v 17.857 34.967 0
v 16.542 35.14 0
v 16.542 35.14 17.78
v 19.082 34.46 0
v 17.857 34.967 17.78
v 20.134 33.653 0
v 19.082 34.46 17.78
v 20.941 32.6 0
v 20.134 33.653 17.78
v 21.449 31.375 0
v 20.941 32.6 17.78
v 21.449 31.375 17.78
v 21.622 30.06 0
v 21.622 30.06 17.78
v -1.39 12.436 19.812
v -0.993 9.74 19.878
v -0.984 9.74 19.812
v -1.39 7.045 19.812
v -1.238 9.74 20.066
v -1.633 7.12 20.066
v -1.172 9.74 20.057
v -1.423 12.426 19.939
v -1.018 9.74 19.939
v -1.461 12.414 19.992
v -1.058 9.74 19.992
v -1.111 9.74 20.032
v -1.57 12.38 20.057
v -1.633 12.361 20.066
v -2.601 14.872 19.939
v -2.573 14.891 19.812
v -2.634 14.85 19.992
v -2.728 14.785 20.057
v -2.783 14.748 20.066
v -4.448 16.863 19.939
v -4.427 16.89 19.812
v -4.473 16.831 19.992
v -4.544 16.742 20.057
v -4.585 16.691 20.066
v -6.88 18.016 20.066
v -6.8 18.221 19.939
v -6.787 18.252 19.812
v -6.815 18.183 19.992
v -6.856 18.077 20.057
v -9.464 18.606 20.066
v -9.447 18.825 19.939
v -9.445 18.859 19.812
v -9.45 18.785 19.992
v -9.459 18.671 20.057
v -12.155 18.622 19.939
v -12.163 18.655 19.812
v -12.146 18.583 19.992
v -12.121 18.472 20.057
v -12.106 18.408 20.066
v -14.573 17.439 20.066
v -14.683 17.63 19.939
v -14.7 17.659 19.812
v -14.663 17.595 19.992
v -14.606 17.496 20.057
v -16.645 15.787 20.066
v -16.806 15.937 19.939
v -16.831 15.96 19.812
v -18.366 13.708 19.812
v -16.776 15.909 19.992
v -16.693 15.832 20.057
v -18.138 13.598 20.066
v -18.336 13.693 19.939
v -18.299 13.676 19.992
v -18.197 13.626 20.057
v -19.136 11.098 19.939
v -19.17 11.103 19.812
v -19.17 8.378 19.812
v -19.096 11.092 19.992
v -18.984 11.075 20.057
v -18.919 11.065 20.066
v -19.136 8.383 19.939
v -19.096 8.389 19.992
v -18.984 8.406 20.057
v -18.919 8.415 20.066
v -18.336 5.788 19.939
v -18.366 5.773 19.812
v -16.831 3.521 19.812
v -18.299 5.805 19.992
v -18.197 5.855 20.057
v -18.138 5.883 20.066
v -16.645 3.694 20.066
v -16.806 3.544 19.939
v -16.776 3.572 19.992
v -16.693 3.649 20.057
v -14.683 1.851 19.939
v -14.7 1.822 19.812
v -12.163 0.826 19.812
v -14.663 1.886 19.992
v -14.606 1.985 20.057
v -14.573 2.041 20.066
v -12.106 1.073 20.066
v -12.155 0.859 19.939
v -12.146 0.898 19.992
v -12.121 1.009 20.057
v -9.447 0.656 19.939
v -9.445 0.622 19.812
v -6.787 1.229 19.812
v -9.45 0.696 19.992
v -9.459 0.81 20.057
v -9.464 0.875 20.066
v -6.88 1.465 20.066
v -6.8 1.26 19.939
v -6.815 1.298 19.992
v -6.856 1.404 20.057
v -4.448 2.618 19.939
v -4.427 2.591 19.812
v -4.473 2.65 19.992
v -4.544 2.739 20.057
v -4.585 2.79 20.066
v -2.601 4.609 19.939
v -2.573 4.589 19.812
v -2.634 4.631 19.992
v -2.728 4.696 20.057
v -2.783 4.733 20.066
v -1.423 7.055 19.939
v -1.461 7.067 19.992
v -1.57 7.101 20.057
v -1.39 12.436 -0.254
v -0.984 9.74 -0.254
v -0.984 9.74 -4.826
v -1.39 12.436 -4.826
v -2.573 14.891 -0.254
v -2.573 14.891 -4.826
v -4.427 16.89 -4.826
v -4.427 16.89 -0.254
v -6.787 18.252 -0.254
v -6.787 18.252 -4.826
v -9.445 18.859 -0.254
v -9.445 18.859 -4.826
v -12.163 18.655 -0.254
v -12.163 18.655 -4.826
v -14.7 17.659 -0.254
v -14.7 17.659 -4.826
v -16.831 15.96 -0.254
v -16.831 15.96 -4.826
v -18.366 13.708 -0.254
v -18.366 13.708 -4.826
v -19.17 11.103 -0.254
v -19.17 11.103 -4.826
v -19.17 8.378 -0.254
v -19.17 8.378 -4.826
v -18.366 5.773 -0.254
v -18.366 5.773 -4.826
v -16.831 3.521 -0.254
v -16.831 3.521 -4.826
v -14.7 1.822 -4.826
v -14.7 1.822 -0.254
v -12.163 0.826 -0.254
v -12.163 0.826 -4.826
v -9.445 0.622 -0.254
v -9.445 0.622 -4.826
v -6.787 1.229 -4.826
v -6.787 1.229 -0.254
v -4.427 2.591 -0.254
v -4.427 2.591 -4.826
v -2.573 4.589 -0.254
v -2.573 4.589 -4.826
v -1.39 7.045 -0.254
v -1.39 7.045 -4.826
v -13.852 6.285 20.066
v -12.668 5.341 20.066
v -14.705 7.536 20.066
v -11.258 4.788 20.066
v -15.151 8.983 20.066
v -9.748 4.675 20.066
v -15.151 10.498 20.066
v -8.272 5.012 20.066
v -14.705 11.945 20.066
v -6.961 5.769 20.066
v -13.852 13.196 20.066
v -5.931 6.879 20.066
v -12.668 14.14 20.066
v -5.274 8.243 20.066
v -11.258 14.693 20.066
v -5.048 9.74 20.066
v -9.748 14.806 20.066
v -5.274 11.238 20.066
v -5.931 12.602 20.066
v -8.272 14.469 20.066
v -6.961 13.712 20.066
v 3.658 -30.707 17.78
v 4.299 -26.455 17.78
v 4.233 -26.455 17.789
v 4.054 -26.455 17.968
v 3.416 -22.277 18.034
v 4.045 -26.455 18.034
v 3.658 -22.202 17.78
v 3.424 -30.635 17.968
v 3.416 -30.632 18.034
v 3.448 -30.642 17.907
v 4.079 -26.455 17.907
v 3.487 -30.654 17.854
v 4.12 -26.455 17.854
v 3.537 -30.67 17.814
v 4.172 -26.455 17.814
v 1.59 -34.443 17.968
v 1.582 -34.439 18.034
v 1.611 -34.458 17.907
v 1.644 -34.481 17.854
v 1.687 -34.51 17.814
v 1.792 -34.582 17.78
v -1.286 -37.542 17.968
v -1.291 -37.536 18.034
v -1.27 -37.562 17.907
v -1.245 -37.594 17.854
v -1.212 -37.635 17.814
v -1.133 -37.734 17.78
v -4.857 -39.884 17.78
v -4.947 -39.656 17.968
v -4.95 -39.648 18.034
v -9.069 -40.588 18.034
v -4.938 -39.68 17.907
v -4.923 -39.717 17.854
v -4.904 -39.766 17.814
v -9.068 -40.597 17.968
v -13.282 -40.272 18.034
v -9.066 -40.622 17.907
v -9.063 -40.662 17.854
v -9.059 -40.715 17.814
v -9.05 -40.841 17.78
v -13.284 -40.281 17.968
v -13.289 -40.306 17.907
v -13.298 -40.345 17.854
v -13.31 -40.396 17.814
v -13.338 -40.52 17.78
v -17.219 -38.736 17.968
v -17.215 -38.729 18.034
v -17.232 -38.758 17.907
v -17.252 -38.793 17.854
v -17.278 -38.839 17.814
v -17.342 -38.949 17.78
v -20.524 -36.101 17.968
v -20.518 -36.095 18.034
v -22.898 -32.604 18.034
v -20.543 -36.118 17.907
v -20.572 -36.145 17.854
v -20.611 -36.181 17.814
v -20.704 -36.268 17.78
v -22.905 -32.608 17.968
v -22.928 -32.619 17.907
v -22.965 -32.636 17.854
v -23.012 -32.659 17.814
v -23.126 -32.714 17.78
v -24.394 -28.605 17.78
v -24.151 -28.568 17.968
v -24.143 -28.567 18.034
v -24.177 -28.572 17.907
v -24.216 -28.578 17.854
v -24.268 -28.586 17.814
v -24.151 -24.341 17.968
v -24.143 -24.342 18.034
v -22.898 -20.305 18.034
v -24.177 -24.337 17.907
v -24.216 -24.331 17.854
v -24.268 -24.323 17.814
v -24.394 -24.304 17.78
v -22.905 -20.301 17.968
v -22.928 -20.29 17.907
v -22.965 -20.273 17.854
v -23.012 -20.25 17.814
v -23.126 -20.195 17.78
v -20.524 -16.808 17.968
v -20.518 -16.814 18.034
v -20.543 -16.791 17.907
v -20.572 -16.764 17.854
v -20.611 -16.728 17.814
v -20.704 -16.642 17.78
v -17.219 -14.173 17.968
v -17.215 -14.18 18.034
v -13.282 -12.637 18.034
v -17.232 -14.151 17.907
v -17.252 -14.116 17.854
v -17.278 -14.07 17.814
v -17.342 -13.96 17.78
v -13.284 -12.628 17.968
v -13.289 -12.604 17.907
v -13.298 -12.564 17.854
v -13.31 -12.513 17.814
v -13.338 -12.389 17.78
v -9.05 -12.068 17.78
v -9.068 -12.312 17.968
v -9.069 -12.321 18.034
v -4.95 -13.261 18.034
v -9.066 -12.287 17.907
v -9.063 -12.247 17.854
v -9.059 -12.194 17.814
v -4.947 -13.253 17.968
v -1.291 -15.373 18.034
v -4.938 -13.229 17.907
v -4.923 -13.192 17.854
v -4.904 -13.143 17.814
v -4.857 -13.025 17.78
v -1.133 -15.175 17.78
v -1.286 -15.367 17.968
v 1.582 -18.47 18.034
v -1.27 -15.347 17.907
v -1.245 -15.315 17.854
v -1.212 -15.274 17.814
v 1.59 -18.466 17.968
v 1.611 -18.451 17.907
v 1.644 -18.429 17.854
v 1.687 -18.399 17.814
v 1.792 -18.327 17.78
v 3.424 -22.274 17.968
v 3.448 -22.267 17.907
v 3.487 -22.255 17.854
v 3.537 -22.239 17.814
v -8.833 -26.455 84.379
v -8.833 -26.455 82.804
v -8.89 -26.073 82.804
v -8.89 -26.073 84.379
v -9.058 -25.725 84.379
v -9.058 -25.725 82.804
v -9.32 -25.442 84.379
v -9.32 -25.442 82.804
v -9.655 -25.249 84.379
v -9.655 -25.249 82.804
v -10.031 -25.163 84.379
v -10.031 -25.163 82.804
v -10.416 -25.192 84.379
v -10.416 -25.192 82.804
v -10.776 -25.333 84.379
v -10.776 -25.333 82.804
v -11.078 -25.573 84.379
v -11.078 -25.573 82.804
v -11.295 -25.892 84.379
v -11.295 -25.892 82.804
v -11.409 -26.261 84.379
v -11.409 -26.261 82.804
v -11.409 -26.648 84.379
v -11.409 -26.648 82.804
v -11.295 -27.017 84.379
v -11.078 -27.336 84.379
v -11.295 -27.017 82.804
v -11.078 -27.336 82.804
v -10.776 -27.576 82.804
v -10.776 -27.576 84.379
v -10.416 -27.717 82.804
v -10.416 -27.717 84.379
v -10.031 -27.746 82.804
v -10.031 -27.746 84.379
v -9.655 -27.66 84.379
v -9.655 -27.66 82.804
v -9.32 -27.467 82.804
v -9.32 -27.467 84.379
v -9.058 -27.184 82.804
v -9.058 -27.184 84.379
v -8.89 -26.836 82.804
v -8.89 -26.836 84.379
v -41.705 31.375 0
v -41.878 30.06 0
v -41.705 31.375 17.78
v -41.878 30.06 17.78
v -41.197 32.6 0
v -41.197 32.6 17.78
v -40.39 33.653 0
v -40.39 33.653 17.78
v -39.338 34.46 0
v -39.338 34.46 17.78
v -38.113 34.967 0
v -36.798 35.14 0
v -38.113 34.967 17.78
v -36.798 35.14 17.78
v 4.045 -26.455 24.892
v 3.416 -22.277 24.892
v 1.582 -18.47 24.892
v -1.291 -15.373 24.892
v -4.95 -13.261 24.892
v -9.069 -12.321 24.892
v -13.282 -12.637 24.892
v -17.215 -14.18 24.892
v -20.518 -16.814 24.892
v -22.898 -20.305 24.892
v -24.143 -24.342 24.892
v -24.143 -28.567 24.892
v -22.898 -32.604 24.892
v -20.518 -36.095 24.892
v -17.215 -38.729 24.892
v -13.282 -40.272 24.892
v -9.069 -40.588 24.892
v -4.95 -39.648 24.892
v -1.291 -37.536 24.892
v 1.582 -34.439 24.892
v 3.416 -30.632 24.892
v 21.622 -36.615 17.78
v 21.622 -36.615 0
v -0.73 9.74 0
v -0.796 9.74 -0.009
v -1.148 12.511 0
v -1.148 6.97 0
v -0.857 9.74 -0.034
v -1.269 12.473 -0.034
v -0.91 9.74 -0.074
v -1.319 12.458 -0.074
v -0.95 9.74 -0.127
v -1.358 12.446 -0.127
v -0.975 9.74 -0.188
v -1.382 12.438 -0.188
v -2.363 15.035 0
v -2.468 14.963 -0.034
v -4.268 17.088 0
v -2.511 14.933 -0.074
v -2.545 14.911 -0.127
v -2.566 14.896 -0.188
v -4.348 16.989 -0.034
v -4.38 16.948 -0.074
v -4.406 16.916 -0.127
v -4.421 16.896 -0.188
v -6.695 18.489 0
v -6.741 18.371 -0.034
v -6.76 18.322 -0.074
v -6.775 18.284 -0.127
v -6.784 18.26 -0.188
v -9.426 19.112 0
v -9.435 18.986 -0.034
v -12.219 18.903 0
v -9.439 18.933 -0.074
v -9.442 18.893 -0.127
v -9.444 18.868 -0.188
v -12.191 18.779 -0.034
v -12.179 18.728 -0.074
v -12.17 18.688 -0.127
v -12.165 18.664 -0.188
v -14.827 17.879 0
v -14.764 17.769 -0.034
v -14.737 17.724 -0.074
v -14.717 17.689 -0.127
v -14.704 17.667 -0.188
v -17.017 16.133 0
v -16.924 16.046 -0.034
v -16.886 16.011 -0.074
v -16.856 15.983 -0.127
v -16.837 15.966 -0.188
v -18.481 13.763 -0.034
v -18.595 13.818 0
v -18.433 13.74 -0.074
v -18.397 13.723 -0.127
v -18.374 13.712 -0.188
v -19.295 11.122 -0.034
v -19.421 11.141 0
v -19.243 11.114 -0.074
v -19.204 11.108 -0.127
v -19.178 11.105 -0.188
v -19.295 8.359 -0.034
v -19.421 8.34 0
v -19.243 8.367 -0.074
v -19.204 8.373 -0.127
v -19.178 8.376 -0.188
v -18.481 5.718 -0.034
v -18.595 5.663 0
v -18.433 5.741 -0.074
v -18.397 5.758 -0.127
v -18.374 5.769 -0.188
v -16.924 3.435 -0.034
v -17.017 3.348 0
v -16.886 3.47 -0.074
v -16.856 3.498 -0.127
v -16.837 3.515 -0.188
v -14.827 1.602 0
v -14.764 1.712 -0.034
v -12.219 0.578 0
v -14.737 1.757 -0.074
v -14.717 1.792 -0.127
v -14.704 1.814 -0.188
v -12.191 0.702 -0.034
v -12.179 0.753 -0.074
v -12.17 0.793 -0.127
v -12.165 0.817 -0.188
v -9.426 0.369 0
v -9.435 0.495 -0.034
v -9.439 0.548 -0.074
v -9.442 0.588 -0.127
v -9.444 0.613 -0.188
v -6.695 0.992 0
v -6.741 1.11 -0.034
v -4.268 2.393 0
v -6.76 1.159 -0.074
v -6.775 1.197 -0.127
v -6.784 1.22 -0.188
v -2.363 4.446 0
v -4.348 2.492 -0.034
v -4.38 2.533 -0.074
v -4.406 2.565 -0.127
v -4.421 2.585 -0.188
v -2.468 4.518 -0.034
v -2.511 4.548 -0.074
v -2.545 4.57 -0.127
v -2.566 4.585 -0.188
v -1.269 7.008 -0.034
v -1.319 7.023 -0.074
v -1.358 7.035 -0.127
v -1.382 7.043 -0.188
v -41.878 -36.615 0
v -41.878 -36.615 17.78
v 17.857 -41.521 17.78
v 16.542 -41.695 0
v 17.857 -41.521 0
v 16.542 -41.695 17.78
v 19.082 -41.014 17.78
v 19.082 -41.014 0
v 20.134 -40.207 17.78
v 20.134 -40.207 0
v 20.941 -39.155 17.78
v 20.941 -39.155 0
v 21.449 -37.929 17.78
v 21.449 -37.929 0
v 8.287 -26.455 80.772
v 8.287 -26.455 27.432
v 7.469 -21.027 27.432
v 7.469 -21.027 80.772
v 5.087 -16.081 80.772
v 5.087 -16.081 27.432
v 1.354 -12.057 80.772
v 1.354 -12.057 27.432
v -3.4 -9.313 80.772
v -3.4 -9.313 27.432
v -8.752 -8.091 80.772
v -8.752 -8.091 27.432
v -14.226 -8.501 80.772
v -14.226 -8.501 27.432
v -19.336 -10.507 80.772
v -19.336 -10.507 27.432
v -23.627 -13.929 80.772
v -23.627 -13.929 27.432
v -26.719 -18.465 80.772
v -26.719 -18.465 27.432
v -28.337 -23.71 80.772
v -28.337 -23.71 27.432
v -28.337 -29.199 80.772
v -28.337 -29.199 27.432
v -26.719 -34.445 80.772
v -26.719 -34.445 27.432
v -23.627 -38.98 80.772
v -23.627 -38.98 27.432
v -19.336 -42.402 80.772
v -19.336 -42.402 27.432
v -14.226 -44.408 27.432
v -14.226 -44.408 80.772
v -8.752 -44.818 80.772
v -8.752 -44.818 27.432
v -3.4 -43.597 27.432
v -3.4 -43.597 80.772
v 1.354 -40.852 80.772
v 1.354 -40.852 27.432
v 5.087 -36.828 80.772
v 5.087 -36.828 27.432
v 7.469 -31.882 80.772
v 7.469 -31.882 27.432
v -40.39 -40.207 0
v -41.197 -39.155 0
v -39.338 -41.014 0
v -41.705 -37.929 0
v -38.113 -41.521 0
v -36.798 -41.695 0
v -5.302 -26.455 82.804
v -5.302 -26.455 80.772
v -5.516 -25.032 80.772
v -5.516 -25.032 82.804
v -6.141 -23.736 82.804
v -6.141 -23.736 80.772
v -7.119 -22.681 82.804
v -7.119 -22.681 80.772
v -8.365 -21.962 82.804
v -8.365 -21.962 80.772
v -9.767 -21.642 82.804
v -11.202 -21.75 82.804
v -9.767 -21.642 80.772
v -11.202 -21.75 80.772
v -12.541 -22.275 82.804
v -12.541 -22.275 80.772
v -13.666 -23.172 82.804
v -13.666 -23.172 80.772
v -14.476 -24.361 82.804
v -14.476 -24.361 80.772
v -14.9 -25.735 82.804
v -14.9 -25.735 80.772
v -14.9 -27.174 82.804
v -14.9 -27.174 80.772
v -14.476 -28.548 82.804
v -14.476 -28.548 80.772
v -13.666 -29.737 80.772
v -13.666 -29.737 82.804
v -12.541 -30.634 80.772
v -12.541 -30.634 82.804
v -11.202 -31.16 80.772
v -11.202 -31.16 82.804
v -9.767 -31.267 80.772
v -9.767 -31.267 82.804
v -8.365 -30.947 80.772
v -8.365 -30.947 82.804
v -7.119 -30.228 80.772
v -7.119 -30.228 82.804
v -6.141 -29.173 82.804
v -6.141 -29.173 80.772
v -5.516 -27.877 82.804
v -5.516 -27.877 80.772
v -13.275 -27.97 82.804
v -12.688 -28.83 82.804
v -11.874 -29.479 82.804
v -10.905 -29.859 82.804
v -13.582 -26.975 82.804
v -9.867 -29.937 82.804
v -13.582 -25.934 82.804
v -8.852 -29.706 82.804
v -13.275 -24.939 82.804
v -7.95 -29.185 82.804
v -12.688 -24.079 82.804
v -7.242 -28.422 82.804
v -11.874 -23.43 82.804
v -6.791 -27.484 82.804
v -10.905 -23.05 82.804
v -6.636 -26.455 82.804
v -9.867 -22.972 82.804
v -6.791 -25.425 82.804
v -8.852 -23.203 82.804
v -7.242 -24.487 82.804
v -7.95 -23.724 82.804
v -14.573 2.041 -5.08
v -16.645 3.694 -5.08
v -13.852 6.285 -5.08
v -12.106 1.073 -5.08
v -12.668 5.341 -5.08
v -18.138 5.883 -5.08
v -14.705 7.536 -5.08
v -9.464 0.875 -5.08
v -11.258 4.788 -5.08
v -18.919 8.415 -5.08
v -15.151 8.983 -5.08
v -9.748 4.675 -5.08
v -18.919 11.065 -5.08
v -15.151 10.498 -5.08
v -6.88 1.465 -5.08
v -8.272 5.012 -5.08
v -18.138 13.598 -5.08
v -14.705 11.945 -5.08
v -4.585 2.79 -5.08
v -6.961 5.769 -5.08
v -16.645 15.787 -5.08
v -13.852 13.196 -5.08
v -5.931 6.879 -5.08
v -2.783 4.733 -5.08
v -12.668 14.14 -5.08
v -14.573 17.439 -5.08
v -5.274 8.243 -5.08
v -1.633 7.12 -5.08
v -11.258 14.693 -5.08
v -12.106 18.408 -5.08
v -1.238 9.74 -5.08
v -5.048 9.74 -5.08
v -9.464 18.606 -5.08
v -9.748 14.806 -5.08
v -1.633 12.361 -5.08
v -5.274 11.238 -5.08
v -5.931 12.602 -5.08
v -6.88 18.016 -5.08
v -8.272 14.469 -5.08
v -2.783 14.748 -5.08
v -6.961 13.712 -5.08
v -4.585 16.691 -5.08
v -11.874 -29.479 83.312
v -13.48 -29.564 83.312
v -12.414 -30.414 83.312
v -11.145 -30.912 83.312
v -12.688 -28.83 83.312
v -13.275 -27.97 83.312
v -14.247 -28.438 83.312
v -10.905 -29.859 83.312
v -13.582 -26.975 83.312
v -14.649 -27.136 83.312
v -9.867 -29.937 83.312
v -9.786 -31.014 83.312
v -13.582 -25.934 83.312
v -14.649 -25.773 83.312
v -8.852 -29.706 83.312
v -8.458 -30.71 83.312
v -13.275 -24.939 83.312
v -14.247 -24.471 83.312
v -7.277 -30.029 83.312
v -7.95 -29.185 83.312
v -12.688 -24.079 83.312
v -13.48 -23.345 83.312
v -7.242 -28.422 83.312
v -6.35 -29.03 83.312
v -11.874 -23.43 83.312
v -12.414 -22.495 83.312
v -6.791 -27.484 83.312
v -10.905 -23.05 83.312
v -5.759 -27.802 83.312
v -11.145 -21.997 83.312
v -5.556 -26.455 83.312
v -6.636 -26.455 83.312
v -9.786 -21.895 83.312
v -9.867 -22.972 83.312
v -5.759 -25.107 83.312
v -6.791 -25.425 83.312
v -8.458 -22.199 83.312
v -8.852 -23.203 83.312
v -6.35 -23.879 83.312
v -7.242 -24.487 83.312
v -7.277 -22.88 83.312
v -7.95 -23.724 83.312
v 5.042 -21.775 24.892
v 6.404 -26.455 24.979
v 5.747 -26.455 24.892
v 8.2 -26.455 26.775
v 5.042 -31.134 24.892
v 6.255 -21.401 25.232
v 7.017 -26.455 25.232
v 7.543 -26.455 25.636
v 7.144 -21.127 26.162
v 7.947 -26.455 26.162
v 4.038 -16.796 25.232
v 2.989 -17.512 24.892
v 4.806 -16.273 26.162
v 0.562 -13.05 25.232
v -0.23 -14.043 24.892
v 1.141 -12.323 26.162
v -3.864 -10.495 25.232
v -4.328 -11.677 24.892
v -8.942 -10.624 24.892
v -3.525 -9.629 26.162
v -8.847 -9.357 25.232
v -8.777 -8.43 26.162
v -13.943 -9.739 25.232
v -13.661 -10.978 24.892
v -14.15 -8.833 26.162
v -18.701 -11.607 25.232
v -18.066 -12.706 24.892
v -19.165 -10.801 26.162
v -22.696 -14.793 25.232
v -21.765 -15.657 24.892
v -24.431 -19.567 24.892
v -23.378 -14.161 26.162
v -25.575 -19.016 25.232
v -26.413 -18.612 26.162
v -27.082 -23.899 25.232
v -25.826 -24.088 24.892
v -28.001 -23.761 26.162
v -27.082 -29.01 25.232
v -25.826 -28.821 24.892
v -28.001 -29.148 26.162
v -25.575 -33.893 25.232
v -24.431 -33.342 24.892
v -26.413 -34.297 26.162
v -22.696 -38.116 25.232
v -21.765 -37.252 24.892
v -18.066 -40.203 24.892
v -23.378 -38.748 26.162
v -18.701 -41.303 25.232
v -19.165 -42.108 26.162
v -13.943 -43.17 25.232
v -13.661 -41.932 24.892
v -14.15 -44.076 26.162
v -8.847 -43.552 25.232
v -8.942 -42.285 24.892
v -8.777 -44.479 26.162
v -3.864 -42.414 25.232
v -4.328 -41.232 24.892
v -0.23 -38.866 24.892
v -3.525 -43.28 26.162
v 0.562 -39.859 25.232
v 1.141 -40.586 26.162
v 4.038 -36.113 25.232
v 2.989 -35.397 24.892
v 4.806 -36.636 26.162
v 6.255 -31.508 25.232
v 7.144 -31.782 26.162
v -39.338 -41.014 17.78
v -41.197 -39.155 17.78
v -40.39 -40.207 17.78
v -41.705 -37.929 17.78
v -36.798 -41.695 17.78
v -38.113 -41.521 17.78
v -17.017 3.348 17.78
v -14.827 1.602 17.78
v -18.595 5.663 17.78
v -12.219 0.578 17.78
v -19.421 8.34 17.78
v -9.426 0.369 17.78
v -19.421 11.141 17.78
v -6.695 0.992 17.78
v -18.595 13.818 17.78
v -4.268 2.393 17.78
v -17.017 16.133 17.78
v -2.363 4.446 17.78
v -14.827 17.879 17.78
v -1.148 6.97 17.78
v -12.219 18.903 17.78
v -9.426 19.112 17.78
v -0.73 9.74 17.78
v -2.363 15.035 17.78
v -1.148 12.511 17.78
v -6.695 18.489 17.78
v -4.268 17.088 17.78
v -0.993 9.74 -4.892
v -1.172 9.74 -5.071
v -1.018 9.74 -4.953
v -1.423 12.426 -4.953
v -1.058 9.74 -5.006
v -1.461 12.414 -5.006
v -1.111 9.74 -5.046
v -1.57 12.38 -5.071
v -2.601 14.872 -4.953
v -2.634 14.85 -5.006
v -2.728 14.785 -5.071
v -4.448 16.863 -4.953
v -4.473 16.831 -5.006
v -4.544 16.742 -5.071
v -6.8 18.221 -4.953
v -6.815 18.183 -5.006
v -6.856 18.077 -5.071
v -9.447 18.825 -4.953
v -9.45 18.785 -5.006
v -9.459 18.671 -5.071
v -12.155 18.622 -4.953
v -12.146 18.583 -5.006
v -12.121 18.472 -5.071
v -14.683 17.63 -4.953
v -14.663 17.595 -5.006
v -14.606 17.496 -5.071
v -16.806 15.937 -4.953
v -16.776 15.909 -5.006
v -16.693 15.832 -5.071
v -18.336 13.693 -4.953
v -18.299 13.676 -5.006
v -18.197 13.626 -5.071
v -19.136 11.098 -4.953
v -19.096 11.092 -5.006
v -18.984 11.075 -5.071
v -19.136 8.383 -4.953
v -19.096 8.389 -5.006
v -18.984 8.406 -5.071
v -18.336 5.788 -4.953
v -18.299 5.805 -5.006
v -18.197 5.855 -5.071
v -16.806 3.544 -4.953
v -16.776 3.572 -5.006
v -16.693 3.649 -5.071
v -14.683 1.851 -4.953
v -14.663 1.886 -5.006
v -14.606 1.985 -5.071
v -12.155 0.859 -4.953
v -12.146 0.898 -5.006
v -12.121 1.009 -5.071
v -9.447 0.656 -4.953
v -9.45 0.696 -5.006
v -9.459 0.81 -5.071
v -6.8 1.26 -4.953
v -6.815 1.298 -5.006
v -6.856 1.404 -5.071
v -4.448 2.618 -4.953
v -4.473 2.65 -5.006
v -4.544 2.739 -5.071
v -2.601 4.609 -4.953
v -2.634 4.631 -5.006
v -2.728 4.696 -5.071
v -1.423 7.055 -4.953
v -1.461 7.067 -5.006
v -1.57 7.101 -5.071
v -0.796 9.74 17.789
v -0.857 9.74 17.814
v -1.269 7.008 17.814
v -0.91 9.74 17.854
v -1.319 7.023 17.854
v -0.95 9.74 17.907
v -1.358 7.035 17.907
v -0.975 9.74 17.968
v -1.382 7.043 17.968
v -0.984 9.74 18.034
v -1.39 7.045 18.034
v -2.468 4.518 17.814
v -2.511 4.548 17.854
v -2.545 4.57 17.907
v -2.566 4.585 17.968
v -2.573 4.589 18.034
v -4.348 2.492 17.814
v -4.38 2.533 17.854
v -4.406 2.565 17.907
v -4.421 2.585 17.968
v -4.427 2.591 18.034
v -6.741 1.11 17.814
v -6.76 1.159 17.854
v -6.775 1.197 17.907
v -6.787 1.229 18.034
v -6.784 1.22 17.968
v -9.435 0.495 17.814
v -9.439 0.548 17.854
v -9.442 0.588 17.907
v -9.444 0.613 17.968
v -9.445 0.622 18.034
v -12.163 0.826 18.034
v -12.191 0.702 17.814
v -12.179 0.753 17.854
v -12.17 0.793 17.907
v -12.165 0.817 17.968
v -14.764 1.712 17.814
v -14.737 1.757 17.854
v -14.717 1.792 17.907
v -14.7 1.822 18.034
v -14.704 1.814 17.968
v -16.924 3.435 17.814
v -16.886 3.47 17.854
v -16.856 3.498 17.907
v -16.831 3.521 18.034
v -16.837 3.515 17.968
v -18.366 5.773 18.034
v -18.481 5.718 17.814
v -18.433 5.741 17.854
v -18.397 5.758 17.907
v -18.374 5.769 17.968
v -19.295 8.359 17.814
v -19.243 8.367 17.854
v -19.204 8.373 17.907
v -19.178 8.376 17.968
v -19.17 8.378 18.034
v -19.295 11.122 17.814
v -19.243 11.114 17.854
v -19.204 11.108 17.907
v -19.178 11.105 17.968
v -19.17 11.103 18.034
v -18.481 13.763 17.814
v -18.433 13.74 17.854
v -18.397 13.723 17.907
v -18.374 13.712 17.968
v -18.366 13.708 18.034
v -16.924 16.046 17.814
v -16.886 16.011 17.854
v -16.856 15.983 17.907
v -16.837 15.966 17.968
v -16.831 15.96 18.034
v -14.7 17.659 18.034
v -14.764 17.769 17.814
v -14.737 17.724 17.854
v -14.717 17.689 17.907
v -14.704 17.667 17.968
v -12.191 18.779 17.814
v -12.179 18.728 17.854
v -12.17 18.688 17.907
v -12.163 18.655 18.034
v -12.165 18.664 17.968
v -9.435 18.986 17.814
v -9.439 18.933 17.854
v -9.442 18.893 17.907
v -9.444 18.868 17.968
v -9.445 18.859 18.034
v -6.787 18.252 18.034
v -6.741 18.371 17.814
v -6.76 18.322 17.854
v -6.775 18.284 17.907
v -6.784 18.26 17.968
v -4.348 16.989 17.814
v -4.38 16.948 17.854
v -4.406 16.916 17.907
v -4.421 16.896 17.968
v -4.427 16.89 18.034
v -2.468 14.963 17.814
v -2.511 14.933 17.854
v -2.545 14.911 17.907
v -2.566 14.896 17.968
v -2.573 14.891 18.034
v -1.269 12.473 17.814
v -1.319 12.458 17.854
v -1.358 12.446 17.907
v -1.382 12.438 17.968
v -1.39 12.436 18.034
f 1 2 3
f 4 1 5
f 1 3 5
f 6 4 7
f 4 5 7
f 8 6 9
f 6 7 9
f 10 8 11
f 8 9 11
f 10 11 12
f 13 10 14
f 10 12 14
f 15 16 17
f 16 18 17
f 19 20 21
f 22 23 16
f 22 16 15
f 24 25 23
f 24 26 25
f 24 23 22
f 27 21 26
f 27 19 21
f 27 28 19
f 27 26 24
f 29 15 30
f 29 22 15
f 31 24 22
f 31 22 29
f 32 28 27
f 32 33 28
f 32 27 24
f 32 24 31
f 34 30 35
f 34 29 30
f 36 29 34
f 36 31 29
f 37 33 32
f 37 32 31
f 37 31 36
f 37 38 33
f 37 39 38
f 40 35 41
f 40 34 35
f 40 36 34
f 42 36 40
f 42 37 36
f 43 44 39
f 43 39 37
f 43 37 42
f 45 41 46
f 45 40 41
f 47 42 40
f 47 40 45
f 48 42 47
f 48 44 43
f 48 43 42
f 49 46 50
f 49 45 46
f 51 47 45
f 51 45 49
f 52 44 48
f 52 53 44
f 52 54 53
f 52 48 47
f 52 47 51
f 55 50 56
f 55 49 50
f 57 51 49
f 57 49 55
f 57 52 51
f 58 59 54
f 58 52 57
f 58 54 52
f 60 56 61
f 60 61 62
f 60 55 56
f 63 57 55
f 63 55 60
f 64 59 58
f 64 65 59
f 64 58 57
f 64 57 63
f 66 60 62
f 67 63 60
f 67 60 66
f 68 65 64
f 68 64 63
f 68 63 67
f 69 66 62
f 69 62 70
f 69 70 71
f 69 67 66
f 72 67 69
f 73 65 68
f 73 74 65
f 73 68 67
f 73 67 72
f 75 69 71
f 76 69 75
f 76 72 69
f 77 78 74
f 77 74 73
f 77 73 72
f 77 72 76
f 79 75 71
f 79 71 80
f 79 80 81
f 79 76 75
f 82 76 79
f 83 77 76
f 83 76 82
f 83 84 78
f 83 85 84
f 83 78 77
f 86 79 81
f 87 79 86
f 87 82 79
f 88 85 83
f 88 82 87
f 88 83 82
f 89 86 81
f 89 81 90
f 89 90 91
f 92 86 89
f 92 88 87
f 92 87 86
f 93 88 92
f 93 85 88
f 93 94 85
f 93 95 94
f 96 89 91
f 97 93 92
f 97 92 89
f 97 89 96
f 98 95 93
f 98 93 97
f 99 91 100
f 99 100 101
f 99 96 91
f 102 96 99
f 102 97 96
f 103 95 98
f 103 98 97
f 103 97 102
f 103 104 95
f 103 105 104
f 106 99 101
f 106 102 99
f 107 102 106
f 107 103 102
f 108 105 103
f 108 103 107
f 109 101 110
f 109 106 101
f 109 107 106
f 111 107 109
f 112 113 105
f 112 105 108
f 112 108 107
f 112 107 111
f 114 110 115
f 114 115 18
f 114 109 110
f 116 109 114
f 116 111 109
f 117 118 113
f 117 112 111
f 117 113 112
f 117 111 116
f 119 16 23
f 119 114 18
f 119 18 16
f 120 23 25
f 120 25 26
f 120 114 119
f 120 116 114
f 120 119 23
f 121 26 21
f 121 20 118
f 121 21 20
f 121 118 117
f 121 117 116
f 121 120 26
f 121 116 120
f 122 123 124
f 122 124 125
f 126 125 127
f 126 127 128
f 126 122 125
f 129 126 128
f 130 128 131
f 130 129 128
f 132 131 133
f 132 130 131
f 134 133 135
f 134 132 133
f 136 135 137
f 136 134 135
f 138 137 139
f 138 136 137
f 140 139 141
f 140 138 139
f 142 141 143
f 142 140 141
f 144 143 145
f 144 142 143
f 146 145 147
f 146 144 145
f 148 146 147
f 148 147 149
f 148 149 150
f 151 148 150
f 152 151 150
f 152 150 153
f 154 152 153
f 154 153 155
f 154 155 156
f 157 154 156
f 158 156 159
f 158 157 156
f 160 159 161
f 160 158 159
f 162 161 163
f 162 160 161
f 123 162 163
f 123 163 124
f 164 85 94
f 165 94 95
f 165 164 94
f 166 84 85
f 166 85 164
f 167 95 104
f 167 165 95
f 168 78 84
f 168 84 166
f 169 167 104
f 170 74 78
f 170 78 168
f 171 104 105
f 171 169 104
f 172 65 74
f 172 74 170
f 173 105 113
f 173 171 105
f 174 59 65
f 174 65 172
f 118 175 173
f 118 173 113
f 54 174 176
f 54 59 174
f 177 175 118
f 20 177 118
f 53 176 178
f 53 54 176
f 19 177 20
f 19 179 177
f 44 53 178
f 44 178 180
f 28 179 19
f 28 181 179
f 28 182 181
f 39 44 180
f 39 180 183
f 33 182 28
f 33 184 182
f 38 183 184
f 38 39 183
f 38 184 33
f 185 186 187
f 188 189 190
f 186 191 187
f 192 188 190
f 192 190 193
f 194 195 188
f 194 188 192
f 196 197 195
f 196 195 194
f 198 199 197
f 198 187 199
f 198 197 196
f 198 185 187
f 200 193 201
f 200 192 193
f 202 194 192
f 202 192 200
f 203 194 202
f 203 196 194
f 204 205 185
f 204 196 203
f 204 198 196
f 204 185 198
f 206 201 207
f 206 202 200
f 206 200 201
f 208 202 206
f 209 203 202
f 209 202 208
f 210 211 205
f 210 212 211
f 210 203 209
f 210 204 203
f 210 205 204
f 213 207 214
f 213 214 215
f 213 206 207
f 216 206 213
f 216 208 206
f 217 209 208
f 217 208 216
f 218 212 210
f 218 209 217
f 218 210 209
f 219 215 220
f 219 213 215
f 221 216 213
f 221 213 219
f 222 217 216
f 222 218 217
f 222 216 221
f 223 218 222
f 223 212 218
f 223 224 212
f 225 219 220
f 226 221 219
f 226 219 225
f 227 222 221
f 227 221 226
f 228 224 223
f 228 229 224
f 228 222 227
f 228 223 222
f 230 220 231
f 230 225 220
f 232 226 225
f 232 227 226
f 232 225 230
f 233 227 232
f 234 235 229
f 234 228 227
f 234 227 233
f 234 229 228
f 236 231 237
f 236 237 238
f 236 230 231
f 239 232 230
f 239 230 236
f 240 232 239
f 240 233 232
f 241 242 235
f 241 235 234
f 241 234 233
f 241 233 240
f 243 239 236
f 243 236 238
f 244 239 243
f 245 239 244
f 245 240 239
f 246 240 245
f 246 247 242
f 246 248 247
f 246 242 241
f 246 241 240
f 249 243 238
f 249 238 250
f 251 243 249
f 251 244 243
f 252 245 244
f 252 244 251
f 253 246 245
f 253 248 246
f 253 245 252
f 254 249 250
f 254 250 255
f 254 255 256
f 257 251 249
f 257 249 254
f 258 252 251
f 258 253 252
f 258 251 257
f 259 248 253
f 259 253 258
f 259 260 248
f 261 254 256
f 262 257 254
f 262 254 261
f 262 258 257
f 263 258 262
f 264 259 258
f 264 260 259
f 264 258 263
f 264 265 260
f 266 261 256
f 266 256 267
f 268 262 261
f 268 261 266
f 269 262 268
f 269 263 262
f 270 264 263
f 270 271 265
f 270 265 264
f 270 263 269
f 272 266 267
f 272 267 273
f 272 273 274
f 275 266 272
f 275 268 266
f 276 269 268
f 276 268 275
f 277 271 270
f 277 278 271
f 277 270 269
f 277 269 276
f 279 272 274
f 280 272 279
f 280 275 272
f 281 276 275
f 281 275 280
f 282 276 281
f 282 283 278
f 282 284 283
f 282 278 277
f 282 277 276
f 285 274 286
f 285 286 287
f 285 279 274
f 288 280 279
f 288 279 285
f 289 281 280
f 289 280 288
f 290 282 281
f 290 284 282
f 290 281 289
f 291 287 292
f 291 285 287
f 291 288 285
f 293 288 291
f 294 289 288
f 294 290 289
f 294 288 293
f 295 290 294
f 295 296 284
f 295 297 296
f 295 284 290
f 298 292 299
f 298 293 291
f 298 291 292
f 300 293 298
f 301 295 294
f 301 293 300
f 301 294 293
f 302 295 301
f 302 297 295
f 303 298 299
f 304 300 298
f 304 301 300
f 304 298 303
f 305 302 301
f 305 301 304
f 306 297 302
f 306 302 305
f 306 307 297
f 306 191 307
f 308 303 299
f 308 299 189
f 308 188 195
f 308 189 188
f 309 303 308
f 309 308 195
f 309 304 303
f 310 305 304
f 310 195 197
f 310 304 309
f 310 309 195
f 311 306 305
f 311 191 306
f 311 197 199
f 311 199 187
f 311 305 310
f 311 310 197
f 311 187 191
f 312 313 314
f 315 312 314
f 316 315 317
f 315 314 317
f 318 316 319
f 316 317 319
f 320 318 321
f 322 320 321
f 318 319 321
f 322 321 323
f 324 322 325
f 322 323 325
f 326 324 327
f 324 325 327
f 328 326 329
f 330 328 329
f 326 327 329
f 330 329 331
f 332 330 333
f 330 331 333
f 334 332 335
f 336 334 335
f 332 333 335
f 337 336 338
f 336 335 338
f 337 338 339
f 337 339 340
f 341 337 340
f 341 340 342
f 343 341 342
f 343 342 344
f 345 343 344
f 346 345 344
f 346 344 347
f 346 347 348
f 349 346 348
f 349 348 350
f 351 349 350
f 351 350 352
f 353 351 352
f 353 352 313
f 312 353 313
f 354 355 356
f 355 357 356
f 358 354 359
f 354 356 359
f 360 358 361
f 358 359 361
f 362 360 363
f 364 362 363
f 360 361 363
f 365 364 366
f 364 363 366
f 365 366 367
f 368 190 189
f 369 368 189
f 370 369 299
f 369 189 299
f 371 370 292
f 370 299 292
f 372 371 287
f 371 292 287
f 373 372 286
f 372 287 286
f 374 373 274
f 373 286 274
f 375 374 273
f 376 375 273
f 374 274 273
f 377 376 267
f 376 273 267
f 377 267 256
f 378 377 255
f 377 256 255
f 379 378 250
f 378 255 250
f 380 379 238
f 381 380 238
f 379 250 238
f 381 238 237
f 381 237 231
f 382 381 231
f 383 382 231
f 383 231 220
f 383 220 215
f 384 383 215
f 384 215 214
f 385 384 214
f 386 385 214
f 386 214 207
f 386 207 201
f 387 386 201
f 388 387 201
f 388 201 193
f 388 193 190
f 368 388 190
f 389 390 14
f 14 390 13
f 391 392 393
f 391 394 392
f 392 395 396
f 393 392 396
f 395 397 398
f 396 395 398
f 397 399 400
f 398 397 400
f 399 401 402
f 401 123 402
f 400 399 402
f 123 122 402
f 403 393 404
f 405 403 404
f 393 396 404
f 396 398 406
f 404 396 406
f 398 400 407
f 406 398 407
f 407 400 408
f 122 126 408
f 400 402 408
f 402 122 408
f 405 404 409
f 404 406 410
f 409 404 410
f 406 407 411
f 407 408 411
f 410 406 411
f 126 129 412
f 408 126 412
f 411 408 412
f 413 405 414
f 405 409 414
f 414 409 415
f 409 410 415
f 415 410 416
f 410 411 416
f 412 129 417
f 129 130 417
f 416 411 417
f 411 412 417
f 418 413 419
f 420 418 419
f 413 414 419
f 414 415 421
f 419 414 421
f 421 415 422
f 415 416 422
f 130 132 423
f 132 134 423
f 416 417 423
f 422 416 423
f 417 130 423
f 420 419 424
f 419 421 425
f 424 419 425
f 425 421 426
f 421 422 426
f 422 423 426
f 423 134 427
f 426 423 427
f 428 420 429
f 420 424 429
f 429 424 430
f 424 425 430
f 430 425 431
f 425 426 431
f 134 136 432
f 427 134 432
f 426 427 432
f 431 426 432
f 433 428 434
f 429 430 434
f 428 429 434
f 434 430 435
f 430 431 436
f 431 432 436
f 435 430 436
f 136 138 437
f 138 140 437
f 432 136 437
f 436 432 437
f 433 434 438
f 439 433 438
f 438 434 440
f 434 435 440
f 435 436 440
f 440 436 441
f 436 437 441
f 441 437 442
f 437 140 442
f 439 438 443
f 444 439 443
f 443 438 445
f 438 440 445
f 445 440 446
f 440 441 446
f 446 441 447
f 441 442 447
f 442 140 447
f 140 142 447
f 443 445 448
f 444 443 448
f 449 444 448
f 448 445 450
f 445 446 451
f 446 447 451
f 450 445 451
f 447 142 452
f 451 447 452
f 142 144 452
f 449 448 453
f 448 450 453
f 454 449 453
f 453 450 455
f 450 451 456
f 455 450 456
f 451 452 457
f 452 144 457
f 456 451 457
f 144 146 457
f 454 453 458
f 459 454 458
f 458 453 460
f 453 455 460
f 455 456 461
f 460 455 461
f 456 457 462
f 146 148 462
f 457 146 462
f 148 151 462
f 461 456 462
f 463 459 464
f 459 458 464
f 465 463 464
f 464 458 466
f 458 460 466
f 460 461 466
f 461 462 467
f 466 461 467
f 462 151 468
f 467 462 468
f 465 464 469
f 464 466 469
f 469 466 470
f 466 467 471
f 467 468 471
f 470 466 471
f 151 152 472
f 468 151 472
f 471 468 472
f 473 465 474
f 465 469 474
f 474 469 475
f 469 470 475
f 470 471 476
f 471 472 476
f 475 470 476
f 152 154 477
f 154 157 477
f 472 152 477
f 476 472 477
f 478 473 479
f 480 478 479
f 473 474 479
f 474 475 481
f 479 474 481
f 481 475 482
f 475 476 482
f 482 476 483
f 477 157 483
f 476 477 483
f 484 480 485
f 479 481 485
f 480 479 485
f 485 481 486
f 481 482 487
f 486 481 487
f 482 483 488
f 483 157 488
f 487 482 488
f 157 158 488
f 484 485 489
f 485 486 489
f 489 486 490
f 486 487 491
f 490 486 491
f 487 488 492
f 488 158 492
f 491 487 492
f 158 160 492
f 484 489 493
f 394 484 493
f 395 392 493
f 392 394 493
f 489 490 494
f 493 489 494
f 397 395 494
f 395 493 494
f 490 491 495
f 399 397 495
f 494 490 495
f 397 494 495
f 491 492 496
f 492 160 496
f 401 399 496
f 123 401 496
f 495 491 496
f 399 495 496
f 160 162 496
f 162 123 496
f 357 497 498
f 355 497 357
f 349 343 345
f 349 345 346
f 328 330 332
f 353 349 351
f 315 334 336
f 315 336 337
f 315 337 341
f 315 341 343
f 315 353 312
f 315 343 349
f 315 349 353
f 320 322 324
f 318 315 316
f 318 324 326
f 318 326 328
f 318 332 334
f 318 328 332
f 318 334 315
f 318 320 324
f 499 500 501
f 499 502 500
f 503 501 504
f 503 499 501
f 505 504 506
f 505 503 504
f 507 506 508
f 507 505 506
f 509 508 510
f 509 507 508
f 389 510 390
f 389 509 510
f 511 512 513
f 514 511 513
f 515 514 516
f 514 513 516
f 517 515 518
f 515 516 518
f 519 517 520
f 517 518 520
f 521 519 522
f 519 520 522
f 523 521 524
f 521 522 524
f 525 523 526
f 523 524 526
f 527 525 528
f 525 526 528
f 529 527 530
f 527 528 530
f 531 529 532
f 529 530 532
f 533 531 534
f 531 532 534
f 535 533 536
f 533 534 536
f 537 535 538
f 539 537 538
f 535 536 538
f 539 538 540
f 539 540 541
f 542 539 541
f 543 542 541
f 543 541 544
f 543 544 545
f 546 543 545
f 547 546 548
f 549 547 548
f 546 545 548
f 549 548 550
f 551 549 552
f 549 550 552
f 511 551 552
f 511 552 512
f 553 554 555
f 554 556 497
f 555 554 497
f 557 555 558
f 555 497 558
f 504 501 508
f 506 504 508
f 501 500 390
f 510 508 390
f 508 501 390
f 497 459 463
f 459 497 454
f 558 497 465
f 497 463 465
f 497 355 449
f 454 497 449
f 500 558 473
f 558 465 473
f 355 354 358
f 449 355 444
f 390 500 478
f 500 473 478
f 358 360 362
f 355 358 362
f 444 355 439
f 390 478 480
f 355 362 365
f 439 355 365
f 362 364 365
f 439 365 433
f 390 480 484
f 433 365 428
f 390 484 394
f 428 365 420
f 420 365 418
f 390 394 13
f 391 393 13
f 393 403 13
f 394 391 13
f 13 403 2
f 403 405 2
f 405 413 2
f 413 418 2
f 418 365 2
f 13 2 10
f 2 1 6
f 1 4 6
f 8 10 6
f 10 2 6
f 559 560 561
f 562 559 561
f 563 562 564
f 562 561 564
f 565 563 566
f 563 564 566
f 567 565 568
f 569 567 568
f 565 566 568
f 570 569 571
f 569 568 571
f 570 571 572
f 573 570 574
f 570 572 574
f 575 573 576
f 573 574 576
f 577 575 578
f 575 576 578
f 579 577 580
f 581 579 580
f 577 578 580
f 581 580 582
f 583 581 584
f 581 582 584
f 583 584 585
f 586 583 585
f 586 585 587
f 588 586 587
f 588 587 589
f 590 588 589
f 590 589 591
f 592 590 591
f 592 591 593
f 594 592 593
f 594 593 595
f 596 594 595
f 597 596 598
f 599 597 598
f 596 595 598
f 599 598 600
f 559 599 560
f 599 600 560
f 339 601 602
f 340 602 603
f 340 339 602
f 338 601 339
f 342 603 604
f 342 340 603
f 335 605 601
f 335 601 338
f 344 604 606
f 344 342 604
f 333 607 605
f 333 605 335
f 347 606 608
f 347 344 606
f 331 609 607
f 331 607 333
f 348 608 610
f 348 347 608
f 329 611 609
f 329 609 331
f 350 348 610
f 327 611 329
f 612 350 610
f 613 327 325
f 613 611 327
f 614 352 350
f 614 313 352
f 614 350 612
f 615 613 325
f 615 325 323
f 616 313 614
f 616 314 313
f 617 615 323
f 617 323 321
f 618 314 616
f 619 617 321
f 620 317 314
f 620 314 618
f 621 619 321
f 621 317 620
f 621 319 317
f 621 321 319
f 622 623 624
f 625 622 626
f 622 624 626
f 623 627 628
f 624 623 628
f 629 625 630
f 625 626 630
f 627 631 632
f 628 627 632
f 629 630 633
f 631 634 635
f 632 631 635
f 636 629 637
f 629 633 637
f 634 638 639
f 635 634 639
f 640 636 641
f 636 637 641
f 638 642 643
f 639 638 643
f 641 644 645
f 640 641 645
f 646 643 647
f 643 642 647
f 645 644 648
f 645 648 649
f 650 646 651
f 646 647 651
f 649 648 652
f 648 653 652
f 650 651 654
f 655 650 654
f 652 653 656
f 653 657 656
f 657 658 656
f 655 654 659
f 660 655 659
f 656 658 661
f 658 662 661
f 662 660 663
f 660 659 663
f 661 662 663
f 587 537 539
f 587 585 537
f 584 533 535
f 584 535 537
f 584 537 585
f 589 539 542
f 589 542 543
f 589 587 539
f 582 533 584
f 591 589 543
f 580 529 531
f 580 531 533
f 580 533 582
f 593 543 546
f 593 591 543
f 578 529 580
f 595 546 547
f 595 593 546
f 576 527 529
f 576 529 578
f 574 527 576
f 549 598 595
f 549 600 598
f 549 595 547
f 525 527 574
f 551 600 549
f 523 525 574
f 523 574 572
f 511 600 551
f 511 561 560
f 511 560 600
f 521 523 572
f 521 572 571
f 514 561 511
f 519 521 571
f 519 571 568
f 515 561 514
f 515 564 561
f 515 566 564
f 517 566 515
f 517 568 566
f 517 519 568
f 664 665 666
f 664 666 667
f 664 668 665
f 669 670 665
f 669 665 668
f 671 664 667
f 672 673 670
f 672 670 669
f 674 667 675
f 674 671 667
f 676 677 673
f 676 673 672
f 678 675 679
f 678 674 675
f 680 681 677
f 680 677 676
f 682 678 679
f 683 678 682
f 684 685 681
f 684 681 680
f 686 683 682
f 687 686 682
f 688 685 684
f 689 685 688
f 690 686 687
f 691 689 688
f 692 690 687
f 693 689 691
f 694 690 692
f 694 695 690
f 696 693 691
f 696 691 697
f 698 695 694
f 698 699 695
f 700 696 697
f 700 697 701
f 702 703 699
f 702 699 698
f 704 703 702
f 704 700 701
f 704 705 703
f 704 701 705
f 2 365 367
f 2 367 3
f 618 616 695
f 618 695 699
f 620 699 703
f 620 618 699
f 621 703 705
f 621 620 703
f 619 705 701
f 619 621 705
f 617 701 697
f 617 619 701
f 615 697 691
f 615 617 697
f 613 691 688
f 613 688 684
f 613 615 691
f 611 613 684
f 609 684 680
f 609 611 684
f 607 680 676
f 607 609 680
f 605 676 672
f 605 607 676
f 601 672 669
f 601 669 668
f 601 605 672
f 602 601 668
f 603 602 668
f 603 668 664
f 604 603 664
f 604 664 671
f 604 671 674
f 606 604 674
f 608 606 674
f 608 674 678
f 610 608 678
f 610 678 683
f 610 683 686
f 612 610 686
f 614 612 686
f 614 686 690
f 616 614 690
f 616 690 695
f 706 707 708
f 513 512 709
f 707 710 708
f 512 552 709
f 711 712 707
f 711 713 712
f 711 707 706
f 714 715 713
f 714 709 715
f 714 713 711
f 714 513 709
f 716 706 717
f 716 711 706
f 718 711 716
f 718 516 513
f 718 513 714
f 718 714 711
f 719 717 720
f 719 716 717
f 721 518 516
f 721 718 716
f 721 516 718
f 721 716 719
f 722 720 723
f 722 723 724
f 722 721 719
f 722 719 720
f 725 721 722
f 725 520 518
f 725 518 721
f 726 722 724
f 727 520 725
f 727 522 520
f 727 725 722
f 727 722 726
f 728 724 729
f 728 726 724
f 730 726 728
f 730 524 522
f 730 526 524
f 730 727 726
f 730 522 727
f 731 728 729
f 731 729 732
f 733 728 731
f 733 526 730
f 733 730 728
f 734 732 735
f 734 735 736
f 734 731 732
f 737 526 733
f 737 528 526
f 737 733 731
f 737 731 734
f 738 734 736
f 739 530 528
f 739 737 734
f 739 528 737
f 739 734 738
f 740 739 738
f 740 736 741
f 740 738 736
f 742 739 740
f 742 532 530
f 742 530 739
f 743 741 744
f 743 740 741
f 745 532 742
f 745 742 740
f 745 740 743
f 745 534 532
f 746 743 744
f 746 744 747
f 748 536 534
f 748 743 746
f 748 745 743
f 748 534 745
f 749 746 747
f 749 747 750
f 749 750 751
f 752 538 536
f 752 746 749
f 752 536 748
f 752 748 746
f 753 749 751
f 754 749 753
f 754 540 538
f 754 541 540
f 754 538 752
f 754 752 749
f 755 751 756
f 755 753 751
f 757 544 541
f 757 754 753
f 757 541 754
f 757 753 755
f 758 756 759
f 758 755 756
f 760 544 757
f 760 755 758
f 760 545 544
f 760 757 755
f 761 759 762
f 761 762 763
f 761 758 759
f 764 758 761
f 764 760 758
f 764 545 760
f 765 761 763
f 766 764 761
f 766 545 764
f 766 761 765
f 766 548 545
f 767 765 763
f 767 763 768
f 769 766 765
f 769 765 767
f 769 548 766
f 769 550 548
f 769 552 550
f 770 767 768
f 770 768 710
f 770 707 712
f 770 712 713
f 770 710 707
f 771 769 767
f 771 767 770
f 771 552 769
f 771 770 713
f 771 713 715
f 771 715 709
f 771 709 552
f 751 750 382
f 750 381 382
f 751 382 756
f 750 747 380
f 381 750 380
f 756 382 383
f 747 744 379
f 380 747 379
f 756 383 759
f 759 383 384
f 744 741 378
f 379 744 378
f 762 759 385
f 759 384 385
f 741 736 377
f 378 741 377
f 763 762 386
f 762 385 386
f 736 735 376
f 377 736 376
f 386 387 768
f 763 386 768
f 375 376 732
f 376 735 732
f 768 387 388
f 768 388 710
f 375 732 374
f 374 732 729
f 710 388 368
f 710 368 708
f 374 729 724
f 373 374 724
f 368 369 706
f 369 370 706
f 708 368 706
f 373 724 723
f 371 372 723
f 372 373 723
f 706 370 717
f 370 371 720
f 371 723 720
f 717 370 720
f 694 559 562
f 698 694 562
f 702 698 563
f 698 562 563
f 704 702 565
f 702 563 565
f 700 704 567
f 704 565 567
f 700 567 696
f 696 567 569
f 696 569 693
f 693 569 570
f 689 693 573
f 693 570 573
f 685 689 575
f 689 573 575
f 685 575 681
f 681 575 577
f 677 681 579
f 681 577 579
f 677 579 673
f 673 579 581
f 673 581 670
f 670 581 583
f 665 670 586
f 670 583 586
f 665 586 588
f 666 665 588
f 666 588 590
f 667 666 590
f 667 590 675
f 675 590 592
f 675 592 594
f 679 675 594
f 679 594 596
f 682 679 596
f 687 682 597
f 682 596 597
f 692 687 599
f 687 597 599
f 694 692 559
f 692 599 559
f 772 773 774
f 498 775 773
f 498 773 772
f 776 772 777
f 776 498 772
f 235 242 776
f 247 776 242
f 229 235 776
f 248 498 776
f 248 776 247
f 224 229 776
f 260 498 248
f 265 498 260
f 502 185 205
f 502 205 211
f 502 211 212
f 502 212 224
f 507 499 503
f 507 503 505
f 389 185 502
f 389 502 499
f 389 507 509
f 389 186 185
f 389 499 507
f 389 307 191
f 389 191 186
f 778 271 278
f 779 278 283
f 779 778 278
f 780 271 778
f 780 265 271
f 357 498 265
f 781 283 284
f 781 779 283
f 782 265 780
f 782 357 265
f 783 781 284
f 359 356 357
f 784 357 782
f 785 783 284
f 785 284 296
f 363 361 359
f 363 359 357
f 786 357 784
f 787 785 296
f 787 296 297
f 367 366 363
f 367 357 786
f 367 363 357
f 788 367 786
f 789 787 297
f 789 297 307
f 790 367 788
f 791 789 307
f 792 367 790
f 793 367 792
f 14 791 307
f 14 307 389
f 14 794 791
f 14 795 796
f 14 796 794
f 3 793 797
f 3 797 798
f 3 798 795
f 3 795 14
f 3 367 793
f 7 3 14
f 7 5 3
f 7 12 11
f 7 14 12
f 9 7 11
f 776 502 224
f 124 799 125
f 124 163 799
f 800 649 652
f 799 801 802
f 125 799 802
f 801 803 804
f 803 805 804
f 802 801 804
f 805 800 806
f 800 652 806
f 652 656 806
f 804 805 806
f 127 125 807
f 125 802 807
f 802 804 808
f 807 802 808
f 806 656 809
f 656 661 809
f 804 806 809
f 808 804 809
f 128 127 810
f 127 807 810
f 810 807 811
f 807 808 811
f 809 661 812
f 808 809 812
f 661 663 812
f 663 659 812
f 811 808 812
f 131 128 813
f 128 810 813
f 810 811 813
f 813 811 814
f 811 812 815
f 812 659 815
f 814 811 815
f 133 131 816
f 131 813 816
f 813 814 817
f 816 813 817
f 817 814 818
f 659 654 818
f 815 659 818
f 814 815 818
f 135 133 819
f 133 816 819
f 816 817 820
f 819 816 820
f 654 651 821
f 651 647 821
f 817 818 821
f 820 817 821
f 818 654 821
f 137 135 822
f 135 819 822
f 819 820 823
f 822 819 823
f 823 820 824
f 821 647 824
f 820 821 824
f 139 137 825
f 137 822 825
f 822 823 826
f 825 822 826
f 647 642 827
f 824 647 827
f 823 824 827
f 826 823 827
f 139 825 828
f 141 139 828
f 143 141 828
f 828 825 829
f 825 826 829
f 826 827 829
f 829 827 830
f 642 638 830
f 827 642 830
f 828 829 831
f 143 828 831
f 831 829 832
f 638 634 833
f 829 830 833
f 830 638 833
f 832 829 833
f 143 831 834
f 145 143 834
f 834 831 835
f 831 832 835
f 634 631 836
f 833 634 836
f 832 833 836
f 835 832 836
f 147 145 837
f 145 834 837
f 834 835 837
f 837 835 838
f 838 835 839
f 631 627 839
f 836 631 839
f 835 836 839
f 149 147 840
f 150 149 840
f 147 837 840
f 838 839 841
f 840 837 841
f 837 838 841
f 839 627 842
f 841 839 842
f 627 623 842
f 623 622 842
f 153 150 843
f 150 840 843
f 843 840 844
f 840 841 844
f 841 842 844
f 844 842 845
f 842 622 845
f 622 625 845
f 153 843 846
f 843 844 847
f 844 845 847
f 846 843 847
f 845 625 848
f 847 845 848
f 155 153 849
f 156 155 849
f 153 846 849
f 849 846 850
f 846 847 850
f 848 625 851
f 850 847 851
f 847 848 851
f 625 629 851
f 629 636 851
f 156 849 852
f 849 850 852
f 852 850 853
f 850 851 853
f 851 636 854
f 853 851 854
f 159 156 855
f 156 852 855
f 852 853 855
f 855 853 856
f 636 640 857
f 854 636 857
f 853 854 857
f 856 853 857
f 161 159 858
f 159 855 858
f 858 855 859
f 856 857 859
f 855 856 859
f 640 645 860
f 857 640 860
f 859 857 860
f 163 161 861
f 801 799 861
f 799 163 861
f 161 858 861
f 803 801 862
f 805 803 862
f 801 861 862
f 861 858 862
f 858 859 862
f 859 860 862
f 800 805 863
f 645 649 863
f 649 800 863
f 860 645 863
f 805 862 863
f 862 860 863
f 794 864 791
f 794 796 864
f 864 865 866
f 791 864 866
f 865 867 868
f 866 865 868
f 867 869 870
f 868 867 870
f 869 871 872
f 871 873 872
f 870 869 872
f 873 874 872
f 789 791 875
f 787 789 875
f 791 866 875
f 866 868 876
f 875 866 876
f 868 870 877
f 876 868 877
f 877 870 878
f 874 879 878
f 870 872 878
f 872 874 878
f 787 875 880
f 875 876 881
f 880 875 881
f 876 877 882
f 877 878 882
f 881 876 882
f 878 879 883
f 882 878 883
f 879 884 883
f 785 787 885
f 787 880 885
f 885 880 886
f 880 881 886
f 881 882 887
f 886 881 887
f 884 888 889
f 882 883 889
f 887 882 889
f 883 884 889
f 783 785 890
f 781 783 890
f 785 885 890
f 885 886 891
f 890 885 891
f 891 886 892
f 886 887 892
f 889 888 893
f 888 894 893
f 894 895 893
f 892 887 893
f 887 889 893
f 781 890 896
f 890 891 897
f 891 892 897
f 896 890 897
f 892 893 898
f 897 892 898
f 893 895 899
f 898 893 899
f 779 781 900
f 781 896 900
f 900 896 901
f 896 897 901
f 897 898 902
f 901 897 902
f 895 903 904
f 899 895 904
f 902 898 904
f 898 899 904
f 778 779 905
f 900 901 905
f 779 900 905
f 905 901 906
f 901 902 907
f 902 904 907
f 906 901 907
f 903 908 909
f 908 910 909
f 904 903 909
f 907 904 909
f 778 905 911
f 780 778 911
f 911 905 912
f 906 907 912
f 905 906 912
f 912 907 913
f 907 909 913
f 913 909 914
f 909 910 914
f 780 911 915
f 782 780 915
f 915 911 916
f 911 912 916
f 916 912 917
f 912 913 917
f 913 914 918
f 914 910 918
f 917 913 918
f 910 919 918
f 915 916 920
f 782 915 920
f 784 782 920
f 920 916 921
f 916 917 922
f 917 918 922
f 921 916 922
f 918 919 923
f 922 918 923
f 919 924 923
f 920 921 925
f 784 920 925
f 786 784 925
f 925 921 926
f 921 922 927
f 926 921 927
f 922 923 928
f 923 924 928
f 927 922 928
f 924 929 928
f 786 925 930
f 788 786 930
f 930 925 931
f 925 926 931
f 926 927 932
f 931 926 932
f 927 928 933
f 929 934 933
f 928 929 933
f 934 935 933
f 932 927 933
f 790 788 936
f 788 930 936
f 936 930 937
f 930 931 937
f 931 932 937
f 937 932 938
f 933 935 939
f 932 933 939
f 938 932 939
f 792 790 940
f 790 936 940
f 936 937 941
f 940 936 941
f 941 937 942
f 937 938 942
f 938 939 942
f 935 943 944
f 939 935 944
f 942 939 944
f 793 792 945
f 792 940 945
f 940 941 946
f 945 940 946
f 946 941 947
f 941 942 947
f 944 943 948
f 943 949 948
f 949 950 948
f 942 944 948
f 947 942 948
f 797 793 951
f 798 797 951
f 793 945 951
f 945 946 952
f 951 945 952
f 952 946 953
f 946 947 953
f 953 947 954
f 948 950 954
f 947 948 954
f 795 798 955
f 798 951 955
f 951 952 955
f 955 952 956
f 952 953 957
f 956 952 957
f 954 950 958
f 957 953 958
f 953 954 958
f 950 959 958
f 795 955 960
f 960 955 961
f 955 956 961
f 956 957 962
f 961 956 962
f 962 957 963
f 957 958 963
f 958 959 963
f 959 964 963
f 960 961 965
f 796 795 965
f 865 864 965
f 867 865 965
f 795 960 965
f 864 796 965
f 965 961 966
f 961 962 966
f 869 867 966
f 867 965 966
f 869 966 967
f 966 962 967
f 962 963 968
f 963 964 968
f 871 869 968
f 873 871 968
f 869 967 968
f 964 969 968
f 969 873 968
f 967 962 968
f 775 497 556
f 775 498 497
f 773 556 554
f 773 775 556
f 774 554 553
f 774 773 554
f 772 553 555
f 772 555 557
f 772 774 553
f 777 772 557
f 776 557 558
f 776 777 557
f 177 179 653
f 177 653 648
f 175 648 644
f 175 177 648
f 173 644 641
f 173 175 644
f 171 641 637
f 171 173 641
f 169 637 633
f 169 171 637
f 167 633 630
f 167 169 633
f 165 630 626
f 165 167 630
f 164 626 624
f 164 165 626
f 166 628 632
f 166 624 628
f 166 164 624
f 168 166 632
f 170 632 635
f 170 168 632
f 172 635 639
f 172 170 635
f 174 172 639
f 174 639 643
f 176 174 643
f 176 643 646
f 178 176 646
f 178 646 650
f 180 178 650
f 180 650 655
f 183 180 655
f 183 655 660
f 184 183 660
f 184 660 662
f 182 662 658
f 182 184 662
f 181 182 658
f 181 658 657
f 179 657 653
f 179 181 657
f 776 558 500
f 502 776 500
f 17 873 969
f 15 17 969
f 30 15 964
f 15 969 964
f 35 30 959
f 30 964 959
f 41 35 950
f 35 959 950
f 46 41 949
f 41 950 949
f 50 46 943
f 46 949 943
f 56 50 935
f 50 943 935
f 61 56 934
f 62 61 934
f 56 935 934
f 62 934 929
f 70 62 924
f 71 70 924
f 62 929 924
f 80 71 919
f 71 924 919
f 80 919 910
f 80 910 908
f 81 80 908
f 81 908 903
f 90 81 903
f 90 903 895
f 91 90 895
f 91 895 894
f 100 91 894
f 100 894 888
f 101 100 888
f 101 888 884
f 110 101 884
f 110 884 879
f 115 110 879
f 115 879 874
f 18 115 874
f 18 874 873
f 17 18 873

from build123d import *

# Parameters (mm, degrees)
F0_W      = 63.5
F0_H      = 76.835
F0_R      = 14.1732
F0_R_2    = 9.144
F0_R_3    = 5.08
F0_R_4    = 4.445
F1_DEPTH  = 17.78
F2_DEPTH  = 24.892
F3_DEPTH  = 20.066
F4_DEPTH  = 25.4
F5_R      = 18.415
F5_R_2    = 14.1732
F6_DEPTH  = 55.88
F7_DEPTH  = 5.08
F8_R      = 5.08
F9_R      = 0.254
F10_R     = 2.54
F11_R     = 0.254
F12_R     = 4.826
F12_R_2   = 3.4925
F13_DEPTH = 2.54
F12_R_3   = 1.2954
F14_DEPTH = 3.6068
F15_DEPTH = 2.032
F16_SIZE2 = 0.508
F16_SIZE  = 0.254


with BuildPart() as f1:
    # F0 (on Top) → F1 (new body)
    with BuildSketch(Plane.XY):
        with Locations((-10.1280088154, -3.2770447433)):
            Rectangle(F0_W, F0_H)
        with Locations((-10.1280088154, -26.4545447433)):
            Circle(F0_R, mode=Mode.SUBTRACT)
        with Locations((-10.1280088154, 9.7404552567)):
            Circle(F0_R_2, mode=Mode.SUBTRACT)
        with Locations((-10.1280088154, -26.4545447433)):
            Circle(F0_R)
        with Locations((-10.1280088154, 9.7404552567)):
            Circle(F0_R_2)
        with Locations((-10.1280088154, 9.7404552567)):
            Circle(F0_R_3, mode=Mode.SUBTRACT)
        with Locations((-10.1280088154, 9.7404552567)):
            Circle(F0_R_3)
        with Locations((-10.1280088154, 9.7404552567)):
            Circle(F0_R_4, mode=Mode.SUBTRACT)
        with Locations((-10.1280088154, 9.7404552567)):
            Circle(F0_R_4)
    extrude(amount=F1_DEPTH)

    # F0 (on Top) → F2 (join)
    with BuildSketch(Plane.XY):
        with Locations((-10.1280088154, -26.4545447433)):
            Circle(F0_R)
    extrude(amount=F2_DEPTH)

    # F0 (on Top) → F3 (join)
    with BuildSketch(Plane.XY):
        with Locations((-10.1280088154, 9.7404552567)):
            Circle(F0_R_2)
        with Locations((-10.1280088154, 9.7404552567)):
            Circle(F0_R_3, mode=Mode.SUBTRACT)
    extrude(amount=F3_DEPTH)

    # F4 (cut): a face of the model
    f4_faces = [f1.faces().sort_by_distance(p)[0] for p in [
        (-10.1280088154, 9.7404552567, 17.78),
    ]]
    extrude(f4_faces, amount=-F4_DEPTH, mode=Mode.SUBTRACT)

    # F5 (on face) → F6 (join)
    with BuildSketch(Plane.XY.offset(24.892)):
        with Locations((-10.1280088154, -26.4545447433)):
            Circle(F5_R)
        with Locations((-10.1280088154, -26.4545447433)):
            Circle(F5_R_2, mode=Mode.SUBTRACT)
        with Locations((-10.1280088154, -26.4545447433)):
            Circle(F5_R_2)
    extrude(amount=F6_DEPTH)

    # F0 (on Top) → F7 (join)
    with BuildSketch(Plane.XY):
        with Locations((-10.1280088154, 9.7404552567)):
            Circle(F0_R_2)
        with Locations((-10.1280088154, 9.7404552567)):
            Circle(F0_R_3, mode=Mode.SUBTRACT)
    extrude(amount=-F7_DEPTH)

    # F8
    f8_edges = [f1.edges().sort_by_distance(p)[0] for p in [
        (-41.878009, 35.140455, 8.89),
        (21.621991, 35.140455, 8.89),
        (21.621991, -41.694545, 8.89),
        (-41.878009, -41.694545, 8.89),
    ]]
    fillet(f8_edges, radius=F8_R)

    # F9
    f9_edges = [f1.edges().sort_by_distance(p)[0] for p in [
        (-19.272009, 9.740455, 17.78),
        (-0.984009, 9.740455, 18.923),
        (-19.272009, 9.740455, 20.066),
        (-19.272009, 9.740455, 0),
        (-19.272009, 9.740455, -5.08),
    ]]
    fillet(f9_edges, radius=F9_R)

    # F10
    f10_edges = [f1.edges().sort_by_distance(p)[0] for p in [
        (-28.543009, -26.454545, 24.892),
    ]]
    fillet(f10_edges, radius=F10_R)

    # F11
    f11_edges = [f1.edges().sort_by_distance(p)[0] for p in [
        (-24.301209, -26.454545, 17.78),
    ]]
    fillet(f11_edges, radius=F11_R)

    # F12 (on face) → F13 (join)
    with BuildSketch(Plane.XY.offset(80.772)):
        with Locations((-10.1280088154, -26.4545447433)):
            Circle(F12_R)
        with Locations((-10.1280088154, -26.4545447433)):
            Circle(F12_R_2, mode=Mode.SUBTRACT)
    extrude(amount=F13_DEPTH)

    # F12 (on face) → F14 (join)
    with BuildSketch(Plane.XY.offset(80.772)):
        with Locations((-10.1280088154, -26.4545447433)):
            Circle(F12_R_3)
    extrude(amount=F14_DEPTH)

    # F12 (on face) → F15 (join)
    with BuildSketch(Plane.XY.offset(80.772)):
        with Locations((-10.1280088154, -26.4545447433)):
            Circle(F12_R_2)
        with Locations((-10.1280088154, -26.4545447433)):
            Circle(F12_R_3, mode=Mode.SUBTRACT)
    extrude(amount=F15_DEPTH)

    # F16
    f16_edges = [f1.edges().sort_by_distance(p)[0] for p in [
        (-14.954009, -26.454545, 83.312),
    ]]
    f16_side = f1.faces().sort_by_distance((-14.817509, -26.454545, 83.312))[0]
    chamfer(f16_edges, length=F16_SIZE, length2=F16_SIZE2, reference=f16_side)


solid = f1.part
